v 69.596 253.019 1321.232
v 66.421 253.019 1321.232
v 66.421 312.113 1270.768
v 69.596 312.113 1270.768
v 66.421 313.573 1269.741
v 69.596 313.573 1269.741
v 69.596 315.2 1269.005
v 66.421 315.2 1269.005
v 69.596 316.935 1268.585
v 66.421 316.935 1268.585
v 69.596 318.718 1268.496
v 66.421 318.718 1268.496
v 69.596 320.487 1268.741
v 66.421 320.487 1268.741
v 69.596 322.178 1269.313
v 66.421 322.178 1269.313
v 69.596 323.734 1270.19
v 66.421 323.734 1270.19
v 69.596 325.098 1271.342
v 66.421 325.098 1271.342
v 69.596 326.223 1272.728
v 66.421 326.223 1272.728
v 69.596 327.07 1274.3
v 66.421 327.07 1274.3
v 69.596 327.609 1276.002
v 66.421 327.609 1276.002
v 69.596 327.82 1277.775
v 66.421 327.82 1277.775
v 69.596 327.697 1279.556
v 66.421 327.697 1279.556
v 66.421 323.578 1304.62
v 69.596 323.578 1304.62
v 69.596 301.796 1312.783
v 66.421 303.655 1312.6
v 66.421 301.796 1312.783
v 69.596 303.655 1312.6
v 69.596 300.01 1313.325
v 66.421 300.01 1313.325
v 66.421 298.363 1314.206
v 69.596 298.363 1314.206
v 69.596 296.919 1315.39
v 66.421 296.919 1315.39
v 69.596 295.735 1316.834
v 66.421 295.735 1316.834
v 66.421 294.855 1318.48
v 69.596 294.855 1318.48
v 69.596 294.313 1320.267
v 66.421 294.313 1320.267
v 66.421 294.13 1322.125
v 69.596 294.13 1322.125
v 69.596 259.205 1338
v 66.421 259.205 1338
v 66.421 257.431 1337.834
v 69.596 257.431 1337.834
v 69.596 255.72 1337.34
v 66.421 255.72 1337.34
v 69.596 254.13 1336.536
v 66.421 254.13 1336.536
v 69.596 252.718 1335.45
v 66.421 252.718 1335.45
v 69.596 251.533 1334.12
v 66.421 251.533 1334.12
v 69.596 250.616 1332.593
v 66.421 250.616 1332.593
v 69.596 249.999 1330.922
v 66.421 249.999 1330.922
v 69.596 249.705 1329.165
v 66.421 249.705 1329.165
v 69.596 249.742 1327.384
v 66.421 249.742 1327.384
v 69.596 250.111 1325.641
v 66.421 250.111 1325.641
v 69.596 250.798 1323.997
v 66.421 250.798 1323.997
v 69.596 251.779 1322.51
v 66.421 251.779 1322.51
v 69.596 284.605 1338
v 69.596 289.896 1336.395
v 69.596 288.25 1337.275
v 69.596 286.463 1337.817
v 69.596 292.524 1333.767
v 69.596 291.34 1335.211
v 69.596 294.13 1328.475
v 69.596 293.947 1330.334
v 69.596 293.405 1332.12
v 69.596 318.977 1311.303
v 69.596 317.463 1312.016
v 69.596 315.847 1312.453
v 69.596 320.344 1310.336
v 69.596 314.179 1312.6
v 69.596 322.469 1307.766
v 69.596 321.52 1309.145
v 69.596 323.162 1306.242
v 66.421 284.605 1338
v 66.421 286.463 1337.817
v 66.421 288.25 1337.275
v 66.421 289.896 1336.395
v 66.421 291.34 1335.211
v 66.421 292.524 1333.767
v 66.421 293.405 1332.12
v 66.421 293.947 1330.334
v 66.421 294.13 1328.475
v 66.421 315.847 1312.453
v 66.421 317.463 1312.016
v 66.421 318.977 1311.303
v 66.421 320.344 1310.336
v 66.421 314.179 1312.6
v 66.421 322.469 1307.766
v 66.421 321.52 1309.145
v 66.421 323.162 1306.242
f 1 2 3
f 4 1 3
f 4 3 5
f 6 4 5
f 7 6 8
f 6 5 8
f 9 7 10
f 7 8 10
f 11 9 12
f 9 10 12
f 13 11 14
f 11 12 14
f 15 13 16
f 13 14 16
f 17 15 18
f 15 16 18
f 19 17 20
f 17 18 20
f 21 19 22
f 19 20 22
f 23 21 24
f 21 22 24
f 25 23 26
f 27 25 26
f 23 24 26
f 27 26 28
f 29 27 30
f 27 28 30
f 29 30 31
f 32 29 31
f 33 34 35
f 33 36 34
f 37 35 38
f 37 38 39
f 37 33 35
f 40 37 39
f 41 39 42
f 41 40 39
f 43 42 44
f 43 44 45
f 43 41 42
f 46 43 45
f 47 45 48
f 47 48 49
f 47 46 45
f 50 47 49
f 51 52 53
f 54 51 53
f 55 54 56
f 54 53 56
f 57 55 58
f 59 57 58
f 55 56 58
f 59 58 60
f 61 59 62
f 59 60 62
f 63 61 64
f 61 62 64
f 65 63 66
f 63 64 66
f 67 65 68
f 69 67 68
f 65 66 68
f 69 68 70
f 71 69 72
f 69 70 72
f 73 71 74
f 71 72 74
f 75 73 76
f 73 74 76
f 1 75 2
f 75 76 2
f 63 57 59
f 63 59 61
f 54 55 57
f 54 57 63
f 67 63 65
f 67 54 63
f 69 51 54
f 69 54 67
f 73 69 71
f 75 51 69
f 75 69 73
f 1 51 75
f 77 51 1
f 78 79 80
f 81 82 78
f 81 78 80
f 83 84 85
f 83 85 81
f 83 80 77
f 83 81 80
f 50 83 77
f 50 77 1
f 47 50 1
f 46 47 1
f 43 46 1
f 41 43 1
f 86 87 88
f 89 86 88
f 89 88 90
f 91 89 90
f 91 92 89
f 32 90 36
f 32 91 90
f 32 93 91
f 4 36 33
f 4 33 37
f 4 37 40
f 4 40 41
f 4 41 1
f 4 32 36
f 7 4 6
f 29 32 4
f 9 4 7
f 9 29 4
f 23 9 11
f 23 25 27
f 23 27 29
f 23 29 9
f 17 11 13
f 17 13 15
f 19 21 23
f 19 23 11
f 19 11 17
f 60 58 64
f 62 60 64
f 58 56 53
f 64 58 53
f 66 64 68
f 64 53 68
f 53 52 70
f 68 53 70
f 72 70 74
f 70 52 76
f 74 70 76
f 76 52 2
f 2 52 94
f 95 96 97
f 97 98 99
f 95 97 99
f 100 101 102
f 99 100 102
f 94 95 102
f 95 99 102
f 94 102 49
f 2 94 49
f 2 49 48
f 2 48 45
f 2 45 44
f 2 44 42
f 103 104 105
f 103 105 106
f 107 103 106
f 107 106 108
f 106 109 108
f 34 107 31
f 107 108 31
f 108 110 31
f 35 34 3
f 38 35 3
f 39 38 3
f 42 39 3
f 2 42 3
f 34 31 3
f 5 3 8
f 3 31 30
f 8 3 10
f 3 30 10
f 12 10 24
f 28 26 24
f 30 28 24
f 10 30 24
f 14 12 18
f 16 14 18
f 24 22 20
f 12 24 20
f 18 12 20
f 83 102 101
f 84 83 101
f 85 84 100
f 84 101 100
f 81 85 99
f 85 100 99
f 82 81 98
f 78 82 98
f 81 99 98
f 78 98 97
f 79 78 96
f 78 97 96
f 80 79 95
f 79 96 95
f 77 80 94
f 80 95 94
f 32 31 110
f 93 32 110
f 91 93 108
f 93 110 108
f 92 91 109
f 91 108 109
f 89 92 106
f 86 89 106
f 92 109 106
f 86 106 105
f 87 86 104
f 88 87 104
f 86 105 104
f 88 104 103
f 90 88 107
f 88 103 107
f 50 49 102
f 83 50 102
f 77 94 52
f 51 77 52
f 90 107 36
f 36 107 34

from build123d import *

# Parameters (mm, degrees)
BOSS_EXTRUDE1_START = 66.421062
BOSS_EXTRUDE1_DEPTH = 3.175
FILLET1_R           = 9.525


with BuildPart() as part:
    # Sketch1 → Boss-Extrude1 (new body)
    with BuildSketch(Plane(origin=(0, 0, 0), x_dir=(0, 0, -1), z_dir=(1, 0, 0)).offset(BOSS_EXTRUDE1_START)):
        with BuildLine():
            Line((-1321.232047874, 253.01907305), (-1270.768280058, 312.11266745))
            ThreePointArc((-1270.768280058, 312.11266745), (-1269.714759772, 322.976697122), (-1279.556254241, 327.697081886))
            Line((-1279.556254241, 327.697081886), (-1304.620022056, 323.577914146))
            ThreePointArc((-1304.620022056, 323.577914146), (-1310.336145998, 320.343921033), (-1312.600334154, 314.179001215))
            Line((-1312.600334154, 314.179001215), (-1312.600334154, 294.129574554))
            Line((-1312.600334154, 294.129574554), (-1328.475334154, 294.129574554))
            ThreePointArc((-1328.475334154, 294.129574554), (-1335.210526245, 291.339766645), (-1338.000334154, 284.604574554))
            Line((-1338.000334154, 284.604574554), (-1338.000334154, 259.204574554))
            ThreePointArc((-1338.000334154, 259.204574554), (-1331.771796135, 250.268190307), (-1321.232047874, 253.01907305))
        make_face()
    extrude(amount=BOSS_EXTRUDE1_DEPTH)

    # Fillet1
    fillet1_edges = [part.edges().sort_by_distance(p)[0] for p in [
        (68.008562, 294.129574554, 1312.600334154),
    ]]
    fillet(fillet1_edges, radius=FILLET1_R)


solid = part.part
